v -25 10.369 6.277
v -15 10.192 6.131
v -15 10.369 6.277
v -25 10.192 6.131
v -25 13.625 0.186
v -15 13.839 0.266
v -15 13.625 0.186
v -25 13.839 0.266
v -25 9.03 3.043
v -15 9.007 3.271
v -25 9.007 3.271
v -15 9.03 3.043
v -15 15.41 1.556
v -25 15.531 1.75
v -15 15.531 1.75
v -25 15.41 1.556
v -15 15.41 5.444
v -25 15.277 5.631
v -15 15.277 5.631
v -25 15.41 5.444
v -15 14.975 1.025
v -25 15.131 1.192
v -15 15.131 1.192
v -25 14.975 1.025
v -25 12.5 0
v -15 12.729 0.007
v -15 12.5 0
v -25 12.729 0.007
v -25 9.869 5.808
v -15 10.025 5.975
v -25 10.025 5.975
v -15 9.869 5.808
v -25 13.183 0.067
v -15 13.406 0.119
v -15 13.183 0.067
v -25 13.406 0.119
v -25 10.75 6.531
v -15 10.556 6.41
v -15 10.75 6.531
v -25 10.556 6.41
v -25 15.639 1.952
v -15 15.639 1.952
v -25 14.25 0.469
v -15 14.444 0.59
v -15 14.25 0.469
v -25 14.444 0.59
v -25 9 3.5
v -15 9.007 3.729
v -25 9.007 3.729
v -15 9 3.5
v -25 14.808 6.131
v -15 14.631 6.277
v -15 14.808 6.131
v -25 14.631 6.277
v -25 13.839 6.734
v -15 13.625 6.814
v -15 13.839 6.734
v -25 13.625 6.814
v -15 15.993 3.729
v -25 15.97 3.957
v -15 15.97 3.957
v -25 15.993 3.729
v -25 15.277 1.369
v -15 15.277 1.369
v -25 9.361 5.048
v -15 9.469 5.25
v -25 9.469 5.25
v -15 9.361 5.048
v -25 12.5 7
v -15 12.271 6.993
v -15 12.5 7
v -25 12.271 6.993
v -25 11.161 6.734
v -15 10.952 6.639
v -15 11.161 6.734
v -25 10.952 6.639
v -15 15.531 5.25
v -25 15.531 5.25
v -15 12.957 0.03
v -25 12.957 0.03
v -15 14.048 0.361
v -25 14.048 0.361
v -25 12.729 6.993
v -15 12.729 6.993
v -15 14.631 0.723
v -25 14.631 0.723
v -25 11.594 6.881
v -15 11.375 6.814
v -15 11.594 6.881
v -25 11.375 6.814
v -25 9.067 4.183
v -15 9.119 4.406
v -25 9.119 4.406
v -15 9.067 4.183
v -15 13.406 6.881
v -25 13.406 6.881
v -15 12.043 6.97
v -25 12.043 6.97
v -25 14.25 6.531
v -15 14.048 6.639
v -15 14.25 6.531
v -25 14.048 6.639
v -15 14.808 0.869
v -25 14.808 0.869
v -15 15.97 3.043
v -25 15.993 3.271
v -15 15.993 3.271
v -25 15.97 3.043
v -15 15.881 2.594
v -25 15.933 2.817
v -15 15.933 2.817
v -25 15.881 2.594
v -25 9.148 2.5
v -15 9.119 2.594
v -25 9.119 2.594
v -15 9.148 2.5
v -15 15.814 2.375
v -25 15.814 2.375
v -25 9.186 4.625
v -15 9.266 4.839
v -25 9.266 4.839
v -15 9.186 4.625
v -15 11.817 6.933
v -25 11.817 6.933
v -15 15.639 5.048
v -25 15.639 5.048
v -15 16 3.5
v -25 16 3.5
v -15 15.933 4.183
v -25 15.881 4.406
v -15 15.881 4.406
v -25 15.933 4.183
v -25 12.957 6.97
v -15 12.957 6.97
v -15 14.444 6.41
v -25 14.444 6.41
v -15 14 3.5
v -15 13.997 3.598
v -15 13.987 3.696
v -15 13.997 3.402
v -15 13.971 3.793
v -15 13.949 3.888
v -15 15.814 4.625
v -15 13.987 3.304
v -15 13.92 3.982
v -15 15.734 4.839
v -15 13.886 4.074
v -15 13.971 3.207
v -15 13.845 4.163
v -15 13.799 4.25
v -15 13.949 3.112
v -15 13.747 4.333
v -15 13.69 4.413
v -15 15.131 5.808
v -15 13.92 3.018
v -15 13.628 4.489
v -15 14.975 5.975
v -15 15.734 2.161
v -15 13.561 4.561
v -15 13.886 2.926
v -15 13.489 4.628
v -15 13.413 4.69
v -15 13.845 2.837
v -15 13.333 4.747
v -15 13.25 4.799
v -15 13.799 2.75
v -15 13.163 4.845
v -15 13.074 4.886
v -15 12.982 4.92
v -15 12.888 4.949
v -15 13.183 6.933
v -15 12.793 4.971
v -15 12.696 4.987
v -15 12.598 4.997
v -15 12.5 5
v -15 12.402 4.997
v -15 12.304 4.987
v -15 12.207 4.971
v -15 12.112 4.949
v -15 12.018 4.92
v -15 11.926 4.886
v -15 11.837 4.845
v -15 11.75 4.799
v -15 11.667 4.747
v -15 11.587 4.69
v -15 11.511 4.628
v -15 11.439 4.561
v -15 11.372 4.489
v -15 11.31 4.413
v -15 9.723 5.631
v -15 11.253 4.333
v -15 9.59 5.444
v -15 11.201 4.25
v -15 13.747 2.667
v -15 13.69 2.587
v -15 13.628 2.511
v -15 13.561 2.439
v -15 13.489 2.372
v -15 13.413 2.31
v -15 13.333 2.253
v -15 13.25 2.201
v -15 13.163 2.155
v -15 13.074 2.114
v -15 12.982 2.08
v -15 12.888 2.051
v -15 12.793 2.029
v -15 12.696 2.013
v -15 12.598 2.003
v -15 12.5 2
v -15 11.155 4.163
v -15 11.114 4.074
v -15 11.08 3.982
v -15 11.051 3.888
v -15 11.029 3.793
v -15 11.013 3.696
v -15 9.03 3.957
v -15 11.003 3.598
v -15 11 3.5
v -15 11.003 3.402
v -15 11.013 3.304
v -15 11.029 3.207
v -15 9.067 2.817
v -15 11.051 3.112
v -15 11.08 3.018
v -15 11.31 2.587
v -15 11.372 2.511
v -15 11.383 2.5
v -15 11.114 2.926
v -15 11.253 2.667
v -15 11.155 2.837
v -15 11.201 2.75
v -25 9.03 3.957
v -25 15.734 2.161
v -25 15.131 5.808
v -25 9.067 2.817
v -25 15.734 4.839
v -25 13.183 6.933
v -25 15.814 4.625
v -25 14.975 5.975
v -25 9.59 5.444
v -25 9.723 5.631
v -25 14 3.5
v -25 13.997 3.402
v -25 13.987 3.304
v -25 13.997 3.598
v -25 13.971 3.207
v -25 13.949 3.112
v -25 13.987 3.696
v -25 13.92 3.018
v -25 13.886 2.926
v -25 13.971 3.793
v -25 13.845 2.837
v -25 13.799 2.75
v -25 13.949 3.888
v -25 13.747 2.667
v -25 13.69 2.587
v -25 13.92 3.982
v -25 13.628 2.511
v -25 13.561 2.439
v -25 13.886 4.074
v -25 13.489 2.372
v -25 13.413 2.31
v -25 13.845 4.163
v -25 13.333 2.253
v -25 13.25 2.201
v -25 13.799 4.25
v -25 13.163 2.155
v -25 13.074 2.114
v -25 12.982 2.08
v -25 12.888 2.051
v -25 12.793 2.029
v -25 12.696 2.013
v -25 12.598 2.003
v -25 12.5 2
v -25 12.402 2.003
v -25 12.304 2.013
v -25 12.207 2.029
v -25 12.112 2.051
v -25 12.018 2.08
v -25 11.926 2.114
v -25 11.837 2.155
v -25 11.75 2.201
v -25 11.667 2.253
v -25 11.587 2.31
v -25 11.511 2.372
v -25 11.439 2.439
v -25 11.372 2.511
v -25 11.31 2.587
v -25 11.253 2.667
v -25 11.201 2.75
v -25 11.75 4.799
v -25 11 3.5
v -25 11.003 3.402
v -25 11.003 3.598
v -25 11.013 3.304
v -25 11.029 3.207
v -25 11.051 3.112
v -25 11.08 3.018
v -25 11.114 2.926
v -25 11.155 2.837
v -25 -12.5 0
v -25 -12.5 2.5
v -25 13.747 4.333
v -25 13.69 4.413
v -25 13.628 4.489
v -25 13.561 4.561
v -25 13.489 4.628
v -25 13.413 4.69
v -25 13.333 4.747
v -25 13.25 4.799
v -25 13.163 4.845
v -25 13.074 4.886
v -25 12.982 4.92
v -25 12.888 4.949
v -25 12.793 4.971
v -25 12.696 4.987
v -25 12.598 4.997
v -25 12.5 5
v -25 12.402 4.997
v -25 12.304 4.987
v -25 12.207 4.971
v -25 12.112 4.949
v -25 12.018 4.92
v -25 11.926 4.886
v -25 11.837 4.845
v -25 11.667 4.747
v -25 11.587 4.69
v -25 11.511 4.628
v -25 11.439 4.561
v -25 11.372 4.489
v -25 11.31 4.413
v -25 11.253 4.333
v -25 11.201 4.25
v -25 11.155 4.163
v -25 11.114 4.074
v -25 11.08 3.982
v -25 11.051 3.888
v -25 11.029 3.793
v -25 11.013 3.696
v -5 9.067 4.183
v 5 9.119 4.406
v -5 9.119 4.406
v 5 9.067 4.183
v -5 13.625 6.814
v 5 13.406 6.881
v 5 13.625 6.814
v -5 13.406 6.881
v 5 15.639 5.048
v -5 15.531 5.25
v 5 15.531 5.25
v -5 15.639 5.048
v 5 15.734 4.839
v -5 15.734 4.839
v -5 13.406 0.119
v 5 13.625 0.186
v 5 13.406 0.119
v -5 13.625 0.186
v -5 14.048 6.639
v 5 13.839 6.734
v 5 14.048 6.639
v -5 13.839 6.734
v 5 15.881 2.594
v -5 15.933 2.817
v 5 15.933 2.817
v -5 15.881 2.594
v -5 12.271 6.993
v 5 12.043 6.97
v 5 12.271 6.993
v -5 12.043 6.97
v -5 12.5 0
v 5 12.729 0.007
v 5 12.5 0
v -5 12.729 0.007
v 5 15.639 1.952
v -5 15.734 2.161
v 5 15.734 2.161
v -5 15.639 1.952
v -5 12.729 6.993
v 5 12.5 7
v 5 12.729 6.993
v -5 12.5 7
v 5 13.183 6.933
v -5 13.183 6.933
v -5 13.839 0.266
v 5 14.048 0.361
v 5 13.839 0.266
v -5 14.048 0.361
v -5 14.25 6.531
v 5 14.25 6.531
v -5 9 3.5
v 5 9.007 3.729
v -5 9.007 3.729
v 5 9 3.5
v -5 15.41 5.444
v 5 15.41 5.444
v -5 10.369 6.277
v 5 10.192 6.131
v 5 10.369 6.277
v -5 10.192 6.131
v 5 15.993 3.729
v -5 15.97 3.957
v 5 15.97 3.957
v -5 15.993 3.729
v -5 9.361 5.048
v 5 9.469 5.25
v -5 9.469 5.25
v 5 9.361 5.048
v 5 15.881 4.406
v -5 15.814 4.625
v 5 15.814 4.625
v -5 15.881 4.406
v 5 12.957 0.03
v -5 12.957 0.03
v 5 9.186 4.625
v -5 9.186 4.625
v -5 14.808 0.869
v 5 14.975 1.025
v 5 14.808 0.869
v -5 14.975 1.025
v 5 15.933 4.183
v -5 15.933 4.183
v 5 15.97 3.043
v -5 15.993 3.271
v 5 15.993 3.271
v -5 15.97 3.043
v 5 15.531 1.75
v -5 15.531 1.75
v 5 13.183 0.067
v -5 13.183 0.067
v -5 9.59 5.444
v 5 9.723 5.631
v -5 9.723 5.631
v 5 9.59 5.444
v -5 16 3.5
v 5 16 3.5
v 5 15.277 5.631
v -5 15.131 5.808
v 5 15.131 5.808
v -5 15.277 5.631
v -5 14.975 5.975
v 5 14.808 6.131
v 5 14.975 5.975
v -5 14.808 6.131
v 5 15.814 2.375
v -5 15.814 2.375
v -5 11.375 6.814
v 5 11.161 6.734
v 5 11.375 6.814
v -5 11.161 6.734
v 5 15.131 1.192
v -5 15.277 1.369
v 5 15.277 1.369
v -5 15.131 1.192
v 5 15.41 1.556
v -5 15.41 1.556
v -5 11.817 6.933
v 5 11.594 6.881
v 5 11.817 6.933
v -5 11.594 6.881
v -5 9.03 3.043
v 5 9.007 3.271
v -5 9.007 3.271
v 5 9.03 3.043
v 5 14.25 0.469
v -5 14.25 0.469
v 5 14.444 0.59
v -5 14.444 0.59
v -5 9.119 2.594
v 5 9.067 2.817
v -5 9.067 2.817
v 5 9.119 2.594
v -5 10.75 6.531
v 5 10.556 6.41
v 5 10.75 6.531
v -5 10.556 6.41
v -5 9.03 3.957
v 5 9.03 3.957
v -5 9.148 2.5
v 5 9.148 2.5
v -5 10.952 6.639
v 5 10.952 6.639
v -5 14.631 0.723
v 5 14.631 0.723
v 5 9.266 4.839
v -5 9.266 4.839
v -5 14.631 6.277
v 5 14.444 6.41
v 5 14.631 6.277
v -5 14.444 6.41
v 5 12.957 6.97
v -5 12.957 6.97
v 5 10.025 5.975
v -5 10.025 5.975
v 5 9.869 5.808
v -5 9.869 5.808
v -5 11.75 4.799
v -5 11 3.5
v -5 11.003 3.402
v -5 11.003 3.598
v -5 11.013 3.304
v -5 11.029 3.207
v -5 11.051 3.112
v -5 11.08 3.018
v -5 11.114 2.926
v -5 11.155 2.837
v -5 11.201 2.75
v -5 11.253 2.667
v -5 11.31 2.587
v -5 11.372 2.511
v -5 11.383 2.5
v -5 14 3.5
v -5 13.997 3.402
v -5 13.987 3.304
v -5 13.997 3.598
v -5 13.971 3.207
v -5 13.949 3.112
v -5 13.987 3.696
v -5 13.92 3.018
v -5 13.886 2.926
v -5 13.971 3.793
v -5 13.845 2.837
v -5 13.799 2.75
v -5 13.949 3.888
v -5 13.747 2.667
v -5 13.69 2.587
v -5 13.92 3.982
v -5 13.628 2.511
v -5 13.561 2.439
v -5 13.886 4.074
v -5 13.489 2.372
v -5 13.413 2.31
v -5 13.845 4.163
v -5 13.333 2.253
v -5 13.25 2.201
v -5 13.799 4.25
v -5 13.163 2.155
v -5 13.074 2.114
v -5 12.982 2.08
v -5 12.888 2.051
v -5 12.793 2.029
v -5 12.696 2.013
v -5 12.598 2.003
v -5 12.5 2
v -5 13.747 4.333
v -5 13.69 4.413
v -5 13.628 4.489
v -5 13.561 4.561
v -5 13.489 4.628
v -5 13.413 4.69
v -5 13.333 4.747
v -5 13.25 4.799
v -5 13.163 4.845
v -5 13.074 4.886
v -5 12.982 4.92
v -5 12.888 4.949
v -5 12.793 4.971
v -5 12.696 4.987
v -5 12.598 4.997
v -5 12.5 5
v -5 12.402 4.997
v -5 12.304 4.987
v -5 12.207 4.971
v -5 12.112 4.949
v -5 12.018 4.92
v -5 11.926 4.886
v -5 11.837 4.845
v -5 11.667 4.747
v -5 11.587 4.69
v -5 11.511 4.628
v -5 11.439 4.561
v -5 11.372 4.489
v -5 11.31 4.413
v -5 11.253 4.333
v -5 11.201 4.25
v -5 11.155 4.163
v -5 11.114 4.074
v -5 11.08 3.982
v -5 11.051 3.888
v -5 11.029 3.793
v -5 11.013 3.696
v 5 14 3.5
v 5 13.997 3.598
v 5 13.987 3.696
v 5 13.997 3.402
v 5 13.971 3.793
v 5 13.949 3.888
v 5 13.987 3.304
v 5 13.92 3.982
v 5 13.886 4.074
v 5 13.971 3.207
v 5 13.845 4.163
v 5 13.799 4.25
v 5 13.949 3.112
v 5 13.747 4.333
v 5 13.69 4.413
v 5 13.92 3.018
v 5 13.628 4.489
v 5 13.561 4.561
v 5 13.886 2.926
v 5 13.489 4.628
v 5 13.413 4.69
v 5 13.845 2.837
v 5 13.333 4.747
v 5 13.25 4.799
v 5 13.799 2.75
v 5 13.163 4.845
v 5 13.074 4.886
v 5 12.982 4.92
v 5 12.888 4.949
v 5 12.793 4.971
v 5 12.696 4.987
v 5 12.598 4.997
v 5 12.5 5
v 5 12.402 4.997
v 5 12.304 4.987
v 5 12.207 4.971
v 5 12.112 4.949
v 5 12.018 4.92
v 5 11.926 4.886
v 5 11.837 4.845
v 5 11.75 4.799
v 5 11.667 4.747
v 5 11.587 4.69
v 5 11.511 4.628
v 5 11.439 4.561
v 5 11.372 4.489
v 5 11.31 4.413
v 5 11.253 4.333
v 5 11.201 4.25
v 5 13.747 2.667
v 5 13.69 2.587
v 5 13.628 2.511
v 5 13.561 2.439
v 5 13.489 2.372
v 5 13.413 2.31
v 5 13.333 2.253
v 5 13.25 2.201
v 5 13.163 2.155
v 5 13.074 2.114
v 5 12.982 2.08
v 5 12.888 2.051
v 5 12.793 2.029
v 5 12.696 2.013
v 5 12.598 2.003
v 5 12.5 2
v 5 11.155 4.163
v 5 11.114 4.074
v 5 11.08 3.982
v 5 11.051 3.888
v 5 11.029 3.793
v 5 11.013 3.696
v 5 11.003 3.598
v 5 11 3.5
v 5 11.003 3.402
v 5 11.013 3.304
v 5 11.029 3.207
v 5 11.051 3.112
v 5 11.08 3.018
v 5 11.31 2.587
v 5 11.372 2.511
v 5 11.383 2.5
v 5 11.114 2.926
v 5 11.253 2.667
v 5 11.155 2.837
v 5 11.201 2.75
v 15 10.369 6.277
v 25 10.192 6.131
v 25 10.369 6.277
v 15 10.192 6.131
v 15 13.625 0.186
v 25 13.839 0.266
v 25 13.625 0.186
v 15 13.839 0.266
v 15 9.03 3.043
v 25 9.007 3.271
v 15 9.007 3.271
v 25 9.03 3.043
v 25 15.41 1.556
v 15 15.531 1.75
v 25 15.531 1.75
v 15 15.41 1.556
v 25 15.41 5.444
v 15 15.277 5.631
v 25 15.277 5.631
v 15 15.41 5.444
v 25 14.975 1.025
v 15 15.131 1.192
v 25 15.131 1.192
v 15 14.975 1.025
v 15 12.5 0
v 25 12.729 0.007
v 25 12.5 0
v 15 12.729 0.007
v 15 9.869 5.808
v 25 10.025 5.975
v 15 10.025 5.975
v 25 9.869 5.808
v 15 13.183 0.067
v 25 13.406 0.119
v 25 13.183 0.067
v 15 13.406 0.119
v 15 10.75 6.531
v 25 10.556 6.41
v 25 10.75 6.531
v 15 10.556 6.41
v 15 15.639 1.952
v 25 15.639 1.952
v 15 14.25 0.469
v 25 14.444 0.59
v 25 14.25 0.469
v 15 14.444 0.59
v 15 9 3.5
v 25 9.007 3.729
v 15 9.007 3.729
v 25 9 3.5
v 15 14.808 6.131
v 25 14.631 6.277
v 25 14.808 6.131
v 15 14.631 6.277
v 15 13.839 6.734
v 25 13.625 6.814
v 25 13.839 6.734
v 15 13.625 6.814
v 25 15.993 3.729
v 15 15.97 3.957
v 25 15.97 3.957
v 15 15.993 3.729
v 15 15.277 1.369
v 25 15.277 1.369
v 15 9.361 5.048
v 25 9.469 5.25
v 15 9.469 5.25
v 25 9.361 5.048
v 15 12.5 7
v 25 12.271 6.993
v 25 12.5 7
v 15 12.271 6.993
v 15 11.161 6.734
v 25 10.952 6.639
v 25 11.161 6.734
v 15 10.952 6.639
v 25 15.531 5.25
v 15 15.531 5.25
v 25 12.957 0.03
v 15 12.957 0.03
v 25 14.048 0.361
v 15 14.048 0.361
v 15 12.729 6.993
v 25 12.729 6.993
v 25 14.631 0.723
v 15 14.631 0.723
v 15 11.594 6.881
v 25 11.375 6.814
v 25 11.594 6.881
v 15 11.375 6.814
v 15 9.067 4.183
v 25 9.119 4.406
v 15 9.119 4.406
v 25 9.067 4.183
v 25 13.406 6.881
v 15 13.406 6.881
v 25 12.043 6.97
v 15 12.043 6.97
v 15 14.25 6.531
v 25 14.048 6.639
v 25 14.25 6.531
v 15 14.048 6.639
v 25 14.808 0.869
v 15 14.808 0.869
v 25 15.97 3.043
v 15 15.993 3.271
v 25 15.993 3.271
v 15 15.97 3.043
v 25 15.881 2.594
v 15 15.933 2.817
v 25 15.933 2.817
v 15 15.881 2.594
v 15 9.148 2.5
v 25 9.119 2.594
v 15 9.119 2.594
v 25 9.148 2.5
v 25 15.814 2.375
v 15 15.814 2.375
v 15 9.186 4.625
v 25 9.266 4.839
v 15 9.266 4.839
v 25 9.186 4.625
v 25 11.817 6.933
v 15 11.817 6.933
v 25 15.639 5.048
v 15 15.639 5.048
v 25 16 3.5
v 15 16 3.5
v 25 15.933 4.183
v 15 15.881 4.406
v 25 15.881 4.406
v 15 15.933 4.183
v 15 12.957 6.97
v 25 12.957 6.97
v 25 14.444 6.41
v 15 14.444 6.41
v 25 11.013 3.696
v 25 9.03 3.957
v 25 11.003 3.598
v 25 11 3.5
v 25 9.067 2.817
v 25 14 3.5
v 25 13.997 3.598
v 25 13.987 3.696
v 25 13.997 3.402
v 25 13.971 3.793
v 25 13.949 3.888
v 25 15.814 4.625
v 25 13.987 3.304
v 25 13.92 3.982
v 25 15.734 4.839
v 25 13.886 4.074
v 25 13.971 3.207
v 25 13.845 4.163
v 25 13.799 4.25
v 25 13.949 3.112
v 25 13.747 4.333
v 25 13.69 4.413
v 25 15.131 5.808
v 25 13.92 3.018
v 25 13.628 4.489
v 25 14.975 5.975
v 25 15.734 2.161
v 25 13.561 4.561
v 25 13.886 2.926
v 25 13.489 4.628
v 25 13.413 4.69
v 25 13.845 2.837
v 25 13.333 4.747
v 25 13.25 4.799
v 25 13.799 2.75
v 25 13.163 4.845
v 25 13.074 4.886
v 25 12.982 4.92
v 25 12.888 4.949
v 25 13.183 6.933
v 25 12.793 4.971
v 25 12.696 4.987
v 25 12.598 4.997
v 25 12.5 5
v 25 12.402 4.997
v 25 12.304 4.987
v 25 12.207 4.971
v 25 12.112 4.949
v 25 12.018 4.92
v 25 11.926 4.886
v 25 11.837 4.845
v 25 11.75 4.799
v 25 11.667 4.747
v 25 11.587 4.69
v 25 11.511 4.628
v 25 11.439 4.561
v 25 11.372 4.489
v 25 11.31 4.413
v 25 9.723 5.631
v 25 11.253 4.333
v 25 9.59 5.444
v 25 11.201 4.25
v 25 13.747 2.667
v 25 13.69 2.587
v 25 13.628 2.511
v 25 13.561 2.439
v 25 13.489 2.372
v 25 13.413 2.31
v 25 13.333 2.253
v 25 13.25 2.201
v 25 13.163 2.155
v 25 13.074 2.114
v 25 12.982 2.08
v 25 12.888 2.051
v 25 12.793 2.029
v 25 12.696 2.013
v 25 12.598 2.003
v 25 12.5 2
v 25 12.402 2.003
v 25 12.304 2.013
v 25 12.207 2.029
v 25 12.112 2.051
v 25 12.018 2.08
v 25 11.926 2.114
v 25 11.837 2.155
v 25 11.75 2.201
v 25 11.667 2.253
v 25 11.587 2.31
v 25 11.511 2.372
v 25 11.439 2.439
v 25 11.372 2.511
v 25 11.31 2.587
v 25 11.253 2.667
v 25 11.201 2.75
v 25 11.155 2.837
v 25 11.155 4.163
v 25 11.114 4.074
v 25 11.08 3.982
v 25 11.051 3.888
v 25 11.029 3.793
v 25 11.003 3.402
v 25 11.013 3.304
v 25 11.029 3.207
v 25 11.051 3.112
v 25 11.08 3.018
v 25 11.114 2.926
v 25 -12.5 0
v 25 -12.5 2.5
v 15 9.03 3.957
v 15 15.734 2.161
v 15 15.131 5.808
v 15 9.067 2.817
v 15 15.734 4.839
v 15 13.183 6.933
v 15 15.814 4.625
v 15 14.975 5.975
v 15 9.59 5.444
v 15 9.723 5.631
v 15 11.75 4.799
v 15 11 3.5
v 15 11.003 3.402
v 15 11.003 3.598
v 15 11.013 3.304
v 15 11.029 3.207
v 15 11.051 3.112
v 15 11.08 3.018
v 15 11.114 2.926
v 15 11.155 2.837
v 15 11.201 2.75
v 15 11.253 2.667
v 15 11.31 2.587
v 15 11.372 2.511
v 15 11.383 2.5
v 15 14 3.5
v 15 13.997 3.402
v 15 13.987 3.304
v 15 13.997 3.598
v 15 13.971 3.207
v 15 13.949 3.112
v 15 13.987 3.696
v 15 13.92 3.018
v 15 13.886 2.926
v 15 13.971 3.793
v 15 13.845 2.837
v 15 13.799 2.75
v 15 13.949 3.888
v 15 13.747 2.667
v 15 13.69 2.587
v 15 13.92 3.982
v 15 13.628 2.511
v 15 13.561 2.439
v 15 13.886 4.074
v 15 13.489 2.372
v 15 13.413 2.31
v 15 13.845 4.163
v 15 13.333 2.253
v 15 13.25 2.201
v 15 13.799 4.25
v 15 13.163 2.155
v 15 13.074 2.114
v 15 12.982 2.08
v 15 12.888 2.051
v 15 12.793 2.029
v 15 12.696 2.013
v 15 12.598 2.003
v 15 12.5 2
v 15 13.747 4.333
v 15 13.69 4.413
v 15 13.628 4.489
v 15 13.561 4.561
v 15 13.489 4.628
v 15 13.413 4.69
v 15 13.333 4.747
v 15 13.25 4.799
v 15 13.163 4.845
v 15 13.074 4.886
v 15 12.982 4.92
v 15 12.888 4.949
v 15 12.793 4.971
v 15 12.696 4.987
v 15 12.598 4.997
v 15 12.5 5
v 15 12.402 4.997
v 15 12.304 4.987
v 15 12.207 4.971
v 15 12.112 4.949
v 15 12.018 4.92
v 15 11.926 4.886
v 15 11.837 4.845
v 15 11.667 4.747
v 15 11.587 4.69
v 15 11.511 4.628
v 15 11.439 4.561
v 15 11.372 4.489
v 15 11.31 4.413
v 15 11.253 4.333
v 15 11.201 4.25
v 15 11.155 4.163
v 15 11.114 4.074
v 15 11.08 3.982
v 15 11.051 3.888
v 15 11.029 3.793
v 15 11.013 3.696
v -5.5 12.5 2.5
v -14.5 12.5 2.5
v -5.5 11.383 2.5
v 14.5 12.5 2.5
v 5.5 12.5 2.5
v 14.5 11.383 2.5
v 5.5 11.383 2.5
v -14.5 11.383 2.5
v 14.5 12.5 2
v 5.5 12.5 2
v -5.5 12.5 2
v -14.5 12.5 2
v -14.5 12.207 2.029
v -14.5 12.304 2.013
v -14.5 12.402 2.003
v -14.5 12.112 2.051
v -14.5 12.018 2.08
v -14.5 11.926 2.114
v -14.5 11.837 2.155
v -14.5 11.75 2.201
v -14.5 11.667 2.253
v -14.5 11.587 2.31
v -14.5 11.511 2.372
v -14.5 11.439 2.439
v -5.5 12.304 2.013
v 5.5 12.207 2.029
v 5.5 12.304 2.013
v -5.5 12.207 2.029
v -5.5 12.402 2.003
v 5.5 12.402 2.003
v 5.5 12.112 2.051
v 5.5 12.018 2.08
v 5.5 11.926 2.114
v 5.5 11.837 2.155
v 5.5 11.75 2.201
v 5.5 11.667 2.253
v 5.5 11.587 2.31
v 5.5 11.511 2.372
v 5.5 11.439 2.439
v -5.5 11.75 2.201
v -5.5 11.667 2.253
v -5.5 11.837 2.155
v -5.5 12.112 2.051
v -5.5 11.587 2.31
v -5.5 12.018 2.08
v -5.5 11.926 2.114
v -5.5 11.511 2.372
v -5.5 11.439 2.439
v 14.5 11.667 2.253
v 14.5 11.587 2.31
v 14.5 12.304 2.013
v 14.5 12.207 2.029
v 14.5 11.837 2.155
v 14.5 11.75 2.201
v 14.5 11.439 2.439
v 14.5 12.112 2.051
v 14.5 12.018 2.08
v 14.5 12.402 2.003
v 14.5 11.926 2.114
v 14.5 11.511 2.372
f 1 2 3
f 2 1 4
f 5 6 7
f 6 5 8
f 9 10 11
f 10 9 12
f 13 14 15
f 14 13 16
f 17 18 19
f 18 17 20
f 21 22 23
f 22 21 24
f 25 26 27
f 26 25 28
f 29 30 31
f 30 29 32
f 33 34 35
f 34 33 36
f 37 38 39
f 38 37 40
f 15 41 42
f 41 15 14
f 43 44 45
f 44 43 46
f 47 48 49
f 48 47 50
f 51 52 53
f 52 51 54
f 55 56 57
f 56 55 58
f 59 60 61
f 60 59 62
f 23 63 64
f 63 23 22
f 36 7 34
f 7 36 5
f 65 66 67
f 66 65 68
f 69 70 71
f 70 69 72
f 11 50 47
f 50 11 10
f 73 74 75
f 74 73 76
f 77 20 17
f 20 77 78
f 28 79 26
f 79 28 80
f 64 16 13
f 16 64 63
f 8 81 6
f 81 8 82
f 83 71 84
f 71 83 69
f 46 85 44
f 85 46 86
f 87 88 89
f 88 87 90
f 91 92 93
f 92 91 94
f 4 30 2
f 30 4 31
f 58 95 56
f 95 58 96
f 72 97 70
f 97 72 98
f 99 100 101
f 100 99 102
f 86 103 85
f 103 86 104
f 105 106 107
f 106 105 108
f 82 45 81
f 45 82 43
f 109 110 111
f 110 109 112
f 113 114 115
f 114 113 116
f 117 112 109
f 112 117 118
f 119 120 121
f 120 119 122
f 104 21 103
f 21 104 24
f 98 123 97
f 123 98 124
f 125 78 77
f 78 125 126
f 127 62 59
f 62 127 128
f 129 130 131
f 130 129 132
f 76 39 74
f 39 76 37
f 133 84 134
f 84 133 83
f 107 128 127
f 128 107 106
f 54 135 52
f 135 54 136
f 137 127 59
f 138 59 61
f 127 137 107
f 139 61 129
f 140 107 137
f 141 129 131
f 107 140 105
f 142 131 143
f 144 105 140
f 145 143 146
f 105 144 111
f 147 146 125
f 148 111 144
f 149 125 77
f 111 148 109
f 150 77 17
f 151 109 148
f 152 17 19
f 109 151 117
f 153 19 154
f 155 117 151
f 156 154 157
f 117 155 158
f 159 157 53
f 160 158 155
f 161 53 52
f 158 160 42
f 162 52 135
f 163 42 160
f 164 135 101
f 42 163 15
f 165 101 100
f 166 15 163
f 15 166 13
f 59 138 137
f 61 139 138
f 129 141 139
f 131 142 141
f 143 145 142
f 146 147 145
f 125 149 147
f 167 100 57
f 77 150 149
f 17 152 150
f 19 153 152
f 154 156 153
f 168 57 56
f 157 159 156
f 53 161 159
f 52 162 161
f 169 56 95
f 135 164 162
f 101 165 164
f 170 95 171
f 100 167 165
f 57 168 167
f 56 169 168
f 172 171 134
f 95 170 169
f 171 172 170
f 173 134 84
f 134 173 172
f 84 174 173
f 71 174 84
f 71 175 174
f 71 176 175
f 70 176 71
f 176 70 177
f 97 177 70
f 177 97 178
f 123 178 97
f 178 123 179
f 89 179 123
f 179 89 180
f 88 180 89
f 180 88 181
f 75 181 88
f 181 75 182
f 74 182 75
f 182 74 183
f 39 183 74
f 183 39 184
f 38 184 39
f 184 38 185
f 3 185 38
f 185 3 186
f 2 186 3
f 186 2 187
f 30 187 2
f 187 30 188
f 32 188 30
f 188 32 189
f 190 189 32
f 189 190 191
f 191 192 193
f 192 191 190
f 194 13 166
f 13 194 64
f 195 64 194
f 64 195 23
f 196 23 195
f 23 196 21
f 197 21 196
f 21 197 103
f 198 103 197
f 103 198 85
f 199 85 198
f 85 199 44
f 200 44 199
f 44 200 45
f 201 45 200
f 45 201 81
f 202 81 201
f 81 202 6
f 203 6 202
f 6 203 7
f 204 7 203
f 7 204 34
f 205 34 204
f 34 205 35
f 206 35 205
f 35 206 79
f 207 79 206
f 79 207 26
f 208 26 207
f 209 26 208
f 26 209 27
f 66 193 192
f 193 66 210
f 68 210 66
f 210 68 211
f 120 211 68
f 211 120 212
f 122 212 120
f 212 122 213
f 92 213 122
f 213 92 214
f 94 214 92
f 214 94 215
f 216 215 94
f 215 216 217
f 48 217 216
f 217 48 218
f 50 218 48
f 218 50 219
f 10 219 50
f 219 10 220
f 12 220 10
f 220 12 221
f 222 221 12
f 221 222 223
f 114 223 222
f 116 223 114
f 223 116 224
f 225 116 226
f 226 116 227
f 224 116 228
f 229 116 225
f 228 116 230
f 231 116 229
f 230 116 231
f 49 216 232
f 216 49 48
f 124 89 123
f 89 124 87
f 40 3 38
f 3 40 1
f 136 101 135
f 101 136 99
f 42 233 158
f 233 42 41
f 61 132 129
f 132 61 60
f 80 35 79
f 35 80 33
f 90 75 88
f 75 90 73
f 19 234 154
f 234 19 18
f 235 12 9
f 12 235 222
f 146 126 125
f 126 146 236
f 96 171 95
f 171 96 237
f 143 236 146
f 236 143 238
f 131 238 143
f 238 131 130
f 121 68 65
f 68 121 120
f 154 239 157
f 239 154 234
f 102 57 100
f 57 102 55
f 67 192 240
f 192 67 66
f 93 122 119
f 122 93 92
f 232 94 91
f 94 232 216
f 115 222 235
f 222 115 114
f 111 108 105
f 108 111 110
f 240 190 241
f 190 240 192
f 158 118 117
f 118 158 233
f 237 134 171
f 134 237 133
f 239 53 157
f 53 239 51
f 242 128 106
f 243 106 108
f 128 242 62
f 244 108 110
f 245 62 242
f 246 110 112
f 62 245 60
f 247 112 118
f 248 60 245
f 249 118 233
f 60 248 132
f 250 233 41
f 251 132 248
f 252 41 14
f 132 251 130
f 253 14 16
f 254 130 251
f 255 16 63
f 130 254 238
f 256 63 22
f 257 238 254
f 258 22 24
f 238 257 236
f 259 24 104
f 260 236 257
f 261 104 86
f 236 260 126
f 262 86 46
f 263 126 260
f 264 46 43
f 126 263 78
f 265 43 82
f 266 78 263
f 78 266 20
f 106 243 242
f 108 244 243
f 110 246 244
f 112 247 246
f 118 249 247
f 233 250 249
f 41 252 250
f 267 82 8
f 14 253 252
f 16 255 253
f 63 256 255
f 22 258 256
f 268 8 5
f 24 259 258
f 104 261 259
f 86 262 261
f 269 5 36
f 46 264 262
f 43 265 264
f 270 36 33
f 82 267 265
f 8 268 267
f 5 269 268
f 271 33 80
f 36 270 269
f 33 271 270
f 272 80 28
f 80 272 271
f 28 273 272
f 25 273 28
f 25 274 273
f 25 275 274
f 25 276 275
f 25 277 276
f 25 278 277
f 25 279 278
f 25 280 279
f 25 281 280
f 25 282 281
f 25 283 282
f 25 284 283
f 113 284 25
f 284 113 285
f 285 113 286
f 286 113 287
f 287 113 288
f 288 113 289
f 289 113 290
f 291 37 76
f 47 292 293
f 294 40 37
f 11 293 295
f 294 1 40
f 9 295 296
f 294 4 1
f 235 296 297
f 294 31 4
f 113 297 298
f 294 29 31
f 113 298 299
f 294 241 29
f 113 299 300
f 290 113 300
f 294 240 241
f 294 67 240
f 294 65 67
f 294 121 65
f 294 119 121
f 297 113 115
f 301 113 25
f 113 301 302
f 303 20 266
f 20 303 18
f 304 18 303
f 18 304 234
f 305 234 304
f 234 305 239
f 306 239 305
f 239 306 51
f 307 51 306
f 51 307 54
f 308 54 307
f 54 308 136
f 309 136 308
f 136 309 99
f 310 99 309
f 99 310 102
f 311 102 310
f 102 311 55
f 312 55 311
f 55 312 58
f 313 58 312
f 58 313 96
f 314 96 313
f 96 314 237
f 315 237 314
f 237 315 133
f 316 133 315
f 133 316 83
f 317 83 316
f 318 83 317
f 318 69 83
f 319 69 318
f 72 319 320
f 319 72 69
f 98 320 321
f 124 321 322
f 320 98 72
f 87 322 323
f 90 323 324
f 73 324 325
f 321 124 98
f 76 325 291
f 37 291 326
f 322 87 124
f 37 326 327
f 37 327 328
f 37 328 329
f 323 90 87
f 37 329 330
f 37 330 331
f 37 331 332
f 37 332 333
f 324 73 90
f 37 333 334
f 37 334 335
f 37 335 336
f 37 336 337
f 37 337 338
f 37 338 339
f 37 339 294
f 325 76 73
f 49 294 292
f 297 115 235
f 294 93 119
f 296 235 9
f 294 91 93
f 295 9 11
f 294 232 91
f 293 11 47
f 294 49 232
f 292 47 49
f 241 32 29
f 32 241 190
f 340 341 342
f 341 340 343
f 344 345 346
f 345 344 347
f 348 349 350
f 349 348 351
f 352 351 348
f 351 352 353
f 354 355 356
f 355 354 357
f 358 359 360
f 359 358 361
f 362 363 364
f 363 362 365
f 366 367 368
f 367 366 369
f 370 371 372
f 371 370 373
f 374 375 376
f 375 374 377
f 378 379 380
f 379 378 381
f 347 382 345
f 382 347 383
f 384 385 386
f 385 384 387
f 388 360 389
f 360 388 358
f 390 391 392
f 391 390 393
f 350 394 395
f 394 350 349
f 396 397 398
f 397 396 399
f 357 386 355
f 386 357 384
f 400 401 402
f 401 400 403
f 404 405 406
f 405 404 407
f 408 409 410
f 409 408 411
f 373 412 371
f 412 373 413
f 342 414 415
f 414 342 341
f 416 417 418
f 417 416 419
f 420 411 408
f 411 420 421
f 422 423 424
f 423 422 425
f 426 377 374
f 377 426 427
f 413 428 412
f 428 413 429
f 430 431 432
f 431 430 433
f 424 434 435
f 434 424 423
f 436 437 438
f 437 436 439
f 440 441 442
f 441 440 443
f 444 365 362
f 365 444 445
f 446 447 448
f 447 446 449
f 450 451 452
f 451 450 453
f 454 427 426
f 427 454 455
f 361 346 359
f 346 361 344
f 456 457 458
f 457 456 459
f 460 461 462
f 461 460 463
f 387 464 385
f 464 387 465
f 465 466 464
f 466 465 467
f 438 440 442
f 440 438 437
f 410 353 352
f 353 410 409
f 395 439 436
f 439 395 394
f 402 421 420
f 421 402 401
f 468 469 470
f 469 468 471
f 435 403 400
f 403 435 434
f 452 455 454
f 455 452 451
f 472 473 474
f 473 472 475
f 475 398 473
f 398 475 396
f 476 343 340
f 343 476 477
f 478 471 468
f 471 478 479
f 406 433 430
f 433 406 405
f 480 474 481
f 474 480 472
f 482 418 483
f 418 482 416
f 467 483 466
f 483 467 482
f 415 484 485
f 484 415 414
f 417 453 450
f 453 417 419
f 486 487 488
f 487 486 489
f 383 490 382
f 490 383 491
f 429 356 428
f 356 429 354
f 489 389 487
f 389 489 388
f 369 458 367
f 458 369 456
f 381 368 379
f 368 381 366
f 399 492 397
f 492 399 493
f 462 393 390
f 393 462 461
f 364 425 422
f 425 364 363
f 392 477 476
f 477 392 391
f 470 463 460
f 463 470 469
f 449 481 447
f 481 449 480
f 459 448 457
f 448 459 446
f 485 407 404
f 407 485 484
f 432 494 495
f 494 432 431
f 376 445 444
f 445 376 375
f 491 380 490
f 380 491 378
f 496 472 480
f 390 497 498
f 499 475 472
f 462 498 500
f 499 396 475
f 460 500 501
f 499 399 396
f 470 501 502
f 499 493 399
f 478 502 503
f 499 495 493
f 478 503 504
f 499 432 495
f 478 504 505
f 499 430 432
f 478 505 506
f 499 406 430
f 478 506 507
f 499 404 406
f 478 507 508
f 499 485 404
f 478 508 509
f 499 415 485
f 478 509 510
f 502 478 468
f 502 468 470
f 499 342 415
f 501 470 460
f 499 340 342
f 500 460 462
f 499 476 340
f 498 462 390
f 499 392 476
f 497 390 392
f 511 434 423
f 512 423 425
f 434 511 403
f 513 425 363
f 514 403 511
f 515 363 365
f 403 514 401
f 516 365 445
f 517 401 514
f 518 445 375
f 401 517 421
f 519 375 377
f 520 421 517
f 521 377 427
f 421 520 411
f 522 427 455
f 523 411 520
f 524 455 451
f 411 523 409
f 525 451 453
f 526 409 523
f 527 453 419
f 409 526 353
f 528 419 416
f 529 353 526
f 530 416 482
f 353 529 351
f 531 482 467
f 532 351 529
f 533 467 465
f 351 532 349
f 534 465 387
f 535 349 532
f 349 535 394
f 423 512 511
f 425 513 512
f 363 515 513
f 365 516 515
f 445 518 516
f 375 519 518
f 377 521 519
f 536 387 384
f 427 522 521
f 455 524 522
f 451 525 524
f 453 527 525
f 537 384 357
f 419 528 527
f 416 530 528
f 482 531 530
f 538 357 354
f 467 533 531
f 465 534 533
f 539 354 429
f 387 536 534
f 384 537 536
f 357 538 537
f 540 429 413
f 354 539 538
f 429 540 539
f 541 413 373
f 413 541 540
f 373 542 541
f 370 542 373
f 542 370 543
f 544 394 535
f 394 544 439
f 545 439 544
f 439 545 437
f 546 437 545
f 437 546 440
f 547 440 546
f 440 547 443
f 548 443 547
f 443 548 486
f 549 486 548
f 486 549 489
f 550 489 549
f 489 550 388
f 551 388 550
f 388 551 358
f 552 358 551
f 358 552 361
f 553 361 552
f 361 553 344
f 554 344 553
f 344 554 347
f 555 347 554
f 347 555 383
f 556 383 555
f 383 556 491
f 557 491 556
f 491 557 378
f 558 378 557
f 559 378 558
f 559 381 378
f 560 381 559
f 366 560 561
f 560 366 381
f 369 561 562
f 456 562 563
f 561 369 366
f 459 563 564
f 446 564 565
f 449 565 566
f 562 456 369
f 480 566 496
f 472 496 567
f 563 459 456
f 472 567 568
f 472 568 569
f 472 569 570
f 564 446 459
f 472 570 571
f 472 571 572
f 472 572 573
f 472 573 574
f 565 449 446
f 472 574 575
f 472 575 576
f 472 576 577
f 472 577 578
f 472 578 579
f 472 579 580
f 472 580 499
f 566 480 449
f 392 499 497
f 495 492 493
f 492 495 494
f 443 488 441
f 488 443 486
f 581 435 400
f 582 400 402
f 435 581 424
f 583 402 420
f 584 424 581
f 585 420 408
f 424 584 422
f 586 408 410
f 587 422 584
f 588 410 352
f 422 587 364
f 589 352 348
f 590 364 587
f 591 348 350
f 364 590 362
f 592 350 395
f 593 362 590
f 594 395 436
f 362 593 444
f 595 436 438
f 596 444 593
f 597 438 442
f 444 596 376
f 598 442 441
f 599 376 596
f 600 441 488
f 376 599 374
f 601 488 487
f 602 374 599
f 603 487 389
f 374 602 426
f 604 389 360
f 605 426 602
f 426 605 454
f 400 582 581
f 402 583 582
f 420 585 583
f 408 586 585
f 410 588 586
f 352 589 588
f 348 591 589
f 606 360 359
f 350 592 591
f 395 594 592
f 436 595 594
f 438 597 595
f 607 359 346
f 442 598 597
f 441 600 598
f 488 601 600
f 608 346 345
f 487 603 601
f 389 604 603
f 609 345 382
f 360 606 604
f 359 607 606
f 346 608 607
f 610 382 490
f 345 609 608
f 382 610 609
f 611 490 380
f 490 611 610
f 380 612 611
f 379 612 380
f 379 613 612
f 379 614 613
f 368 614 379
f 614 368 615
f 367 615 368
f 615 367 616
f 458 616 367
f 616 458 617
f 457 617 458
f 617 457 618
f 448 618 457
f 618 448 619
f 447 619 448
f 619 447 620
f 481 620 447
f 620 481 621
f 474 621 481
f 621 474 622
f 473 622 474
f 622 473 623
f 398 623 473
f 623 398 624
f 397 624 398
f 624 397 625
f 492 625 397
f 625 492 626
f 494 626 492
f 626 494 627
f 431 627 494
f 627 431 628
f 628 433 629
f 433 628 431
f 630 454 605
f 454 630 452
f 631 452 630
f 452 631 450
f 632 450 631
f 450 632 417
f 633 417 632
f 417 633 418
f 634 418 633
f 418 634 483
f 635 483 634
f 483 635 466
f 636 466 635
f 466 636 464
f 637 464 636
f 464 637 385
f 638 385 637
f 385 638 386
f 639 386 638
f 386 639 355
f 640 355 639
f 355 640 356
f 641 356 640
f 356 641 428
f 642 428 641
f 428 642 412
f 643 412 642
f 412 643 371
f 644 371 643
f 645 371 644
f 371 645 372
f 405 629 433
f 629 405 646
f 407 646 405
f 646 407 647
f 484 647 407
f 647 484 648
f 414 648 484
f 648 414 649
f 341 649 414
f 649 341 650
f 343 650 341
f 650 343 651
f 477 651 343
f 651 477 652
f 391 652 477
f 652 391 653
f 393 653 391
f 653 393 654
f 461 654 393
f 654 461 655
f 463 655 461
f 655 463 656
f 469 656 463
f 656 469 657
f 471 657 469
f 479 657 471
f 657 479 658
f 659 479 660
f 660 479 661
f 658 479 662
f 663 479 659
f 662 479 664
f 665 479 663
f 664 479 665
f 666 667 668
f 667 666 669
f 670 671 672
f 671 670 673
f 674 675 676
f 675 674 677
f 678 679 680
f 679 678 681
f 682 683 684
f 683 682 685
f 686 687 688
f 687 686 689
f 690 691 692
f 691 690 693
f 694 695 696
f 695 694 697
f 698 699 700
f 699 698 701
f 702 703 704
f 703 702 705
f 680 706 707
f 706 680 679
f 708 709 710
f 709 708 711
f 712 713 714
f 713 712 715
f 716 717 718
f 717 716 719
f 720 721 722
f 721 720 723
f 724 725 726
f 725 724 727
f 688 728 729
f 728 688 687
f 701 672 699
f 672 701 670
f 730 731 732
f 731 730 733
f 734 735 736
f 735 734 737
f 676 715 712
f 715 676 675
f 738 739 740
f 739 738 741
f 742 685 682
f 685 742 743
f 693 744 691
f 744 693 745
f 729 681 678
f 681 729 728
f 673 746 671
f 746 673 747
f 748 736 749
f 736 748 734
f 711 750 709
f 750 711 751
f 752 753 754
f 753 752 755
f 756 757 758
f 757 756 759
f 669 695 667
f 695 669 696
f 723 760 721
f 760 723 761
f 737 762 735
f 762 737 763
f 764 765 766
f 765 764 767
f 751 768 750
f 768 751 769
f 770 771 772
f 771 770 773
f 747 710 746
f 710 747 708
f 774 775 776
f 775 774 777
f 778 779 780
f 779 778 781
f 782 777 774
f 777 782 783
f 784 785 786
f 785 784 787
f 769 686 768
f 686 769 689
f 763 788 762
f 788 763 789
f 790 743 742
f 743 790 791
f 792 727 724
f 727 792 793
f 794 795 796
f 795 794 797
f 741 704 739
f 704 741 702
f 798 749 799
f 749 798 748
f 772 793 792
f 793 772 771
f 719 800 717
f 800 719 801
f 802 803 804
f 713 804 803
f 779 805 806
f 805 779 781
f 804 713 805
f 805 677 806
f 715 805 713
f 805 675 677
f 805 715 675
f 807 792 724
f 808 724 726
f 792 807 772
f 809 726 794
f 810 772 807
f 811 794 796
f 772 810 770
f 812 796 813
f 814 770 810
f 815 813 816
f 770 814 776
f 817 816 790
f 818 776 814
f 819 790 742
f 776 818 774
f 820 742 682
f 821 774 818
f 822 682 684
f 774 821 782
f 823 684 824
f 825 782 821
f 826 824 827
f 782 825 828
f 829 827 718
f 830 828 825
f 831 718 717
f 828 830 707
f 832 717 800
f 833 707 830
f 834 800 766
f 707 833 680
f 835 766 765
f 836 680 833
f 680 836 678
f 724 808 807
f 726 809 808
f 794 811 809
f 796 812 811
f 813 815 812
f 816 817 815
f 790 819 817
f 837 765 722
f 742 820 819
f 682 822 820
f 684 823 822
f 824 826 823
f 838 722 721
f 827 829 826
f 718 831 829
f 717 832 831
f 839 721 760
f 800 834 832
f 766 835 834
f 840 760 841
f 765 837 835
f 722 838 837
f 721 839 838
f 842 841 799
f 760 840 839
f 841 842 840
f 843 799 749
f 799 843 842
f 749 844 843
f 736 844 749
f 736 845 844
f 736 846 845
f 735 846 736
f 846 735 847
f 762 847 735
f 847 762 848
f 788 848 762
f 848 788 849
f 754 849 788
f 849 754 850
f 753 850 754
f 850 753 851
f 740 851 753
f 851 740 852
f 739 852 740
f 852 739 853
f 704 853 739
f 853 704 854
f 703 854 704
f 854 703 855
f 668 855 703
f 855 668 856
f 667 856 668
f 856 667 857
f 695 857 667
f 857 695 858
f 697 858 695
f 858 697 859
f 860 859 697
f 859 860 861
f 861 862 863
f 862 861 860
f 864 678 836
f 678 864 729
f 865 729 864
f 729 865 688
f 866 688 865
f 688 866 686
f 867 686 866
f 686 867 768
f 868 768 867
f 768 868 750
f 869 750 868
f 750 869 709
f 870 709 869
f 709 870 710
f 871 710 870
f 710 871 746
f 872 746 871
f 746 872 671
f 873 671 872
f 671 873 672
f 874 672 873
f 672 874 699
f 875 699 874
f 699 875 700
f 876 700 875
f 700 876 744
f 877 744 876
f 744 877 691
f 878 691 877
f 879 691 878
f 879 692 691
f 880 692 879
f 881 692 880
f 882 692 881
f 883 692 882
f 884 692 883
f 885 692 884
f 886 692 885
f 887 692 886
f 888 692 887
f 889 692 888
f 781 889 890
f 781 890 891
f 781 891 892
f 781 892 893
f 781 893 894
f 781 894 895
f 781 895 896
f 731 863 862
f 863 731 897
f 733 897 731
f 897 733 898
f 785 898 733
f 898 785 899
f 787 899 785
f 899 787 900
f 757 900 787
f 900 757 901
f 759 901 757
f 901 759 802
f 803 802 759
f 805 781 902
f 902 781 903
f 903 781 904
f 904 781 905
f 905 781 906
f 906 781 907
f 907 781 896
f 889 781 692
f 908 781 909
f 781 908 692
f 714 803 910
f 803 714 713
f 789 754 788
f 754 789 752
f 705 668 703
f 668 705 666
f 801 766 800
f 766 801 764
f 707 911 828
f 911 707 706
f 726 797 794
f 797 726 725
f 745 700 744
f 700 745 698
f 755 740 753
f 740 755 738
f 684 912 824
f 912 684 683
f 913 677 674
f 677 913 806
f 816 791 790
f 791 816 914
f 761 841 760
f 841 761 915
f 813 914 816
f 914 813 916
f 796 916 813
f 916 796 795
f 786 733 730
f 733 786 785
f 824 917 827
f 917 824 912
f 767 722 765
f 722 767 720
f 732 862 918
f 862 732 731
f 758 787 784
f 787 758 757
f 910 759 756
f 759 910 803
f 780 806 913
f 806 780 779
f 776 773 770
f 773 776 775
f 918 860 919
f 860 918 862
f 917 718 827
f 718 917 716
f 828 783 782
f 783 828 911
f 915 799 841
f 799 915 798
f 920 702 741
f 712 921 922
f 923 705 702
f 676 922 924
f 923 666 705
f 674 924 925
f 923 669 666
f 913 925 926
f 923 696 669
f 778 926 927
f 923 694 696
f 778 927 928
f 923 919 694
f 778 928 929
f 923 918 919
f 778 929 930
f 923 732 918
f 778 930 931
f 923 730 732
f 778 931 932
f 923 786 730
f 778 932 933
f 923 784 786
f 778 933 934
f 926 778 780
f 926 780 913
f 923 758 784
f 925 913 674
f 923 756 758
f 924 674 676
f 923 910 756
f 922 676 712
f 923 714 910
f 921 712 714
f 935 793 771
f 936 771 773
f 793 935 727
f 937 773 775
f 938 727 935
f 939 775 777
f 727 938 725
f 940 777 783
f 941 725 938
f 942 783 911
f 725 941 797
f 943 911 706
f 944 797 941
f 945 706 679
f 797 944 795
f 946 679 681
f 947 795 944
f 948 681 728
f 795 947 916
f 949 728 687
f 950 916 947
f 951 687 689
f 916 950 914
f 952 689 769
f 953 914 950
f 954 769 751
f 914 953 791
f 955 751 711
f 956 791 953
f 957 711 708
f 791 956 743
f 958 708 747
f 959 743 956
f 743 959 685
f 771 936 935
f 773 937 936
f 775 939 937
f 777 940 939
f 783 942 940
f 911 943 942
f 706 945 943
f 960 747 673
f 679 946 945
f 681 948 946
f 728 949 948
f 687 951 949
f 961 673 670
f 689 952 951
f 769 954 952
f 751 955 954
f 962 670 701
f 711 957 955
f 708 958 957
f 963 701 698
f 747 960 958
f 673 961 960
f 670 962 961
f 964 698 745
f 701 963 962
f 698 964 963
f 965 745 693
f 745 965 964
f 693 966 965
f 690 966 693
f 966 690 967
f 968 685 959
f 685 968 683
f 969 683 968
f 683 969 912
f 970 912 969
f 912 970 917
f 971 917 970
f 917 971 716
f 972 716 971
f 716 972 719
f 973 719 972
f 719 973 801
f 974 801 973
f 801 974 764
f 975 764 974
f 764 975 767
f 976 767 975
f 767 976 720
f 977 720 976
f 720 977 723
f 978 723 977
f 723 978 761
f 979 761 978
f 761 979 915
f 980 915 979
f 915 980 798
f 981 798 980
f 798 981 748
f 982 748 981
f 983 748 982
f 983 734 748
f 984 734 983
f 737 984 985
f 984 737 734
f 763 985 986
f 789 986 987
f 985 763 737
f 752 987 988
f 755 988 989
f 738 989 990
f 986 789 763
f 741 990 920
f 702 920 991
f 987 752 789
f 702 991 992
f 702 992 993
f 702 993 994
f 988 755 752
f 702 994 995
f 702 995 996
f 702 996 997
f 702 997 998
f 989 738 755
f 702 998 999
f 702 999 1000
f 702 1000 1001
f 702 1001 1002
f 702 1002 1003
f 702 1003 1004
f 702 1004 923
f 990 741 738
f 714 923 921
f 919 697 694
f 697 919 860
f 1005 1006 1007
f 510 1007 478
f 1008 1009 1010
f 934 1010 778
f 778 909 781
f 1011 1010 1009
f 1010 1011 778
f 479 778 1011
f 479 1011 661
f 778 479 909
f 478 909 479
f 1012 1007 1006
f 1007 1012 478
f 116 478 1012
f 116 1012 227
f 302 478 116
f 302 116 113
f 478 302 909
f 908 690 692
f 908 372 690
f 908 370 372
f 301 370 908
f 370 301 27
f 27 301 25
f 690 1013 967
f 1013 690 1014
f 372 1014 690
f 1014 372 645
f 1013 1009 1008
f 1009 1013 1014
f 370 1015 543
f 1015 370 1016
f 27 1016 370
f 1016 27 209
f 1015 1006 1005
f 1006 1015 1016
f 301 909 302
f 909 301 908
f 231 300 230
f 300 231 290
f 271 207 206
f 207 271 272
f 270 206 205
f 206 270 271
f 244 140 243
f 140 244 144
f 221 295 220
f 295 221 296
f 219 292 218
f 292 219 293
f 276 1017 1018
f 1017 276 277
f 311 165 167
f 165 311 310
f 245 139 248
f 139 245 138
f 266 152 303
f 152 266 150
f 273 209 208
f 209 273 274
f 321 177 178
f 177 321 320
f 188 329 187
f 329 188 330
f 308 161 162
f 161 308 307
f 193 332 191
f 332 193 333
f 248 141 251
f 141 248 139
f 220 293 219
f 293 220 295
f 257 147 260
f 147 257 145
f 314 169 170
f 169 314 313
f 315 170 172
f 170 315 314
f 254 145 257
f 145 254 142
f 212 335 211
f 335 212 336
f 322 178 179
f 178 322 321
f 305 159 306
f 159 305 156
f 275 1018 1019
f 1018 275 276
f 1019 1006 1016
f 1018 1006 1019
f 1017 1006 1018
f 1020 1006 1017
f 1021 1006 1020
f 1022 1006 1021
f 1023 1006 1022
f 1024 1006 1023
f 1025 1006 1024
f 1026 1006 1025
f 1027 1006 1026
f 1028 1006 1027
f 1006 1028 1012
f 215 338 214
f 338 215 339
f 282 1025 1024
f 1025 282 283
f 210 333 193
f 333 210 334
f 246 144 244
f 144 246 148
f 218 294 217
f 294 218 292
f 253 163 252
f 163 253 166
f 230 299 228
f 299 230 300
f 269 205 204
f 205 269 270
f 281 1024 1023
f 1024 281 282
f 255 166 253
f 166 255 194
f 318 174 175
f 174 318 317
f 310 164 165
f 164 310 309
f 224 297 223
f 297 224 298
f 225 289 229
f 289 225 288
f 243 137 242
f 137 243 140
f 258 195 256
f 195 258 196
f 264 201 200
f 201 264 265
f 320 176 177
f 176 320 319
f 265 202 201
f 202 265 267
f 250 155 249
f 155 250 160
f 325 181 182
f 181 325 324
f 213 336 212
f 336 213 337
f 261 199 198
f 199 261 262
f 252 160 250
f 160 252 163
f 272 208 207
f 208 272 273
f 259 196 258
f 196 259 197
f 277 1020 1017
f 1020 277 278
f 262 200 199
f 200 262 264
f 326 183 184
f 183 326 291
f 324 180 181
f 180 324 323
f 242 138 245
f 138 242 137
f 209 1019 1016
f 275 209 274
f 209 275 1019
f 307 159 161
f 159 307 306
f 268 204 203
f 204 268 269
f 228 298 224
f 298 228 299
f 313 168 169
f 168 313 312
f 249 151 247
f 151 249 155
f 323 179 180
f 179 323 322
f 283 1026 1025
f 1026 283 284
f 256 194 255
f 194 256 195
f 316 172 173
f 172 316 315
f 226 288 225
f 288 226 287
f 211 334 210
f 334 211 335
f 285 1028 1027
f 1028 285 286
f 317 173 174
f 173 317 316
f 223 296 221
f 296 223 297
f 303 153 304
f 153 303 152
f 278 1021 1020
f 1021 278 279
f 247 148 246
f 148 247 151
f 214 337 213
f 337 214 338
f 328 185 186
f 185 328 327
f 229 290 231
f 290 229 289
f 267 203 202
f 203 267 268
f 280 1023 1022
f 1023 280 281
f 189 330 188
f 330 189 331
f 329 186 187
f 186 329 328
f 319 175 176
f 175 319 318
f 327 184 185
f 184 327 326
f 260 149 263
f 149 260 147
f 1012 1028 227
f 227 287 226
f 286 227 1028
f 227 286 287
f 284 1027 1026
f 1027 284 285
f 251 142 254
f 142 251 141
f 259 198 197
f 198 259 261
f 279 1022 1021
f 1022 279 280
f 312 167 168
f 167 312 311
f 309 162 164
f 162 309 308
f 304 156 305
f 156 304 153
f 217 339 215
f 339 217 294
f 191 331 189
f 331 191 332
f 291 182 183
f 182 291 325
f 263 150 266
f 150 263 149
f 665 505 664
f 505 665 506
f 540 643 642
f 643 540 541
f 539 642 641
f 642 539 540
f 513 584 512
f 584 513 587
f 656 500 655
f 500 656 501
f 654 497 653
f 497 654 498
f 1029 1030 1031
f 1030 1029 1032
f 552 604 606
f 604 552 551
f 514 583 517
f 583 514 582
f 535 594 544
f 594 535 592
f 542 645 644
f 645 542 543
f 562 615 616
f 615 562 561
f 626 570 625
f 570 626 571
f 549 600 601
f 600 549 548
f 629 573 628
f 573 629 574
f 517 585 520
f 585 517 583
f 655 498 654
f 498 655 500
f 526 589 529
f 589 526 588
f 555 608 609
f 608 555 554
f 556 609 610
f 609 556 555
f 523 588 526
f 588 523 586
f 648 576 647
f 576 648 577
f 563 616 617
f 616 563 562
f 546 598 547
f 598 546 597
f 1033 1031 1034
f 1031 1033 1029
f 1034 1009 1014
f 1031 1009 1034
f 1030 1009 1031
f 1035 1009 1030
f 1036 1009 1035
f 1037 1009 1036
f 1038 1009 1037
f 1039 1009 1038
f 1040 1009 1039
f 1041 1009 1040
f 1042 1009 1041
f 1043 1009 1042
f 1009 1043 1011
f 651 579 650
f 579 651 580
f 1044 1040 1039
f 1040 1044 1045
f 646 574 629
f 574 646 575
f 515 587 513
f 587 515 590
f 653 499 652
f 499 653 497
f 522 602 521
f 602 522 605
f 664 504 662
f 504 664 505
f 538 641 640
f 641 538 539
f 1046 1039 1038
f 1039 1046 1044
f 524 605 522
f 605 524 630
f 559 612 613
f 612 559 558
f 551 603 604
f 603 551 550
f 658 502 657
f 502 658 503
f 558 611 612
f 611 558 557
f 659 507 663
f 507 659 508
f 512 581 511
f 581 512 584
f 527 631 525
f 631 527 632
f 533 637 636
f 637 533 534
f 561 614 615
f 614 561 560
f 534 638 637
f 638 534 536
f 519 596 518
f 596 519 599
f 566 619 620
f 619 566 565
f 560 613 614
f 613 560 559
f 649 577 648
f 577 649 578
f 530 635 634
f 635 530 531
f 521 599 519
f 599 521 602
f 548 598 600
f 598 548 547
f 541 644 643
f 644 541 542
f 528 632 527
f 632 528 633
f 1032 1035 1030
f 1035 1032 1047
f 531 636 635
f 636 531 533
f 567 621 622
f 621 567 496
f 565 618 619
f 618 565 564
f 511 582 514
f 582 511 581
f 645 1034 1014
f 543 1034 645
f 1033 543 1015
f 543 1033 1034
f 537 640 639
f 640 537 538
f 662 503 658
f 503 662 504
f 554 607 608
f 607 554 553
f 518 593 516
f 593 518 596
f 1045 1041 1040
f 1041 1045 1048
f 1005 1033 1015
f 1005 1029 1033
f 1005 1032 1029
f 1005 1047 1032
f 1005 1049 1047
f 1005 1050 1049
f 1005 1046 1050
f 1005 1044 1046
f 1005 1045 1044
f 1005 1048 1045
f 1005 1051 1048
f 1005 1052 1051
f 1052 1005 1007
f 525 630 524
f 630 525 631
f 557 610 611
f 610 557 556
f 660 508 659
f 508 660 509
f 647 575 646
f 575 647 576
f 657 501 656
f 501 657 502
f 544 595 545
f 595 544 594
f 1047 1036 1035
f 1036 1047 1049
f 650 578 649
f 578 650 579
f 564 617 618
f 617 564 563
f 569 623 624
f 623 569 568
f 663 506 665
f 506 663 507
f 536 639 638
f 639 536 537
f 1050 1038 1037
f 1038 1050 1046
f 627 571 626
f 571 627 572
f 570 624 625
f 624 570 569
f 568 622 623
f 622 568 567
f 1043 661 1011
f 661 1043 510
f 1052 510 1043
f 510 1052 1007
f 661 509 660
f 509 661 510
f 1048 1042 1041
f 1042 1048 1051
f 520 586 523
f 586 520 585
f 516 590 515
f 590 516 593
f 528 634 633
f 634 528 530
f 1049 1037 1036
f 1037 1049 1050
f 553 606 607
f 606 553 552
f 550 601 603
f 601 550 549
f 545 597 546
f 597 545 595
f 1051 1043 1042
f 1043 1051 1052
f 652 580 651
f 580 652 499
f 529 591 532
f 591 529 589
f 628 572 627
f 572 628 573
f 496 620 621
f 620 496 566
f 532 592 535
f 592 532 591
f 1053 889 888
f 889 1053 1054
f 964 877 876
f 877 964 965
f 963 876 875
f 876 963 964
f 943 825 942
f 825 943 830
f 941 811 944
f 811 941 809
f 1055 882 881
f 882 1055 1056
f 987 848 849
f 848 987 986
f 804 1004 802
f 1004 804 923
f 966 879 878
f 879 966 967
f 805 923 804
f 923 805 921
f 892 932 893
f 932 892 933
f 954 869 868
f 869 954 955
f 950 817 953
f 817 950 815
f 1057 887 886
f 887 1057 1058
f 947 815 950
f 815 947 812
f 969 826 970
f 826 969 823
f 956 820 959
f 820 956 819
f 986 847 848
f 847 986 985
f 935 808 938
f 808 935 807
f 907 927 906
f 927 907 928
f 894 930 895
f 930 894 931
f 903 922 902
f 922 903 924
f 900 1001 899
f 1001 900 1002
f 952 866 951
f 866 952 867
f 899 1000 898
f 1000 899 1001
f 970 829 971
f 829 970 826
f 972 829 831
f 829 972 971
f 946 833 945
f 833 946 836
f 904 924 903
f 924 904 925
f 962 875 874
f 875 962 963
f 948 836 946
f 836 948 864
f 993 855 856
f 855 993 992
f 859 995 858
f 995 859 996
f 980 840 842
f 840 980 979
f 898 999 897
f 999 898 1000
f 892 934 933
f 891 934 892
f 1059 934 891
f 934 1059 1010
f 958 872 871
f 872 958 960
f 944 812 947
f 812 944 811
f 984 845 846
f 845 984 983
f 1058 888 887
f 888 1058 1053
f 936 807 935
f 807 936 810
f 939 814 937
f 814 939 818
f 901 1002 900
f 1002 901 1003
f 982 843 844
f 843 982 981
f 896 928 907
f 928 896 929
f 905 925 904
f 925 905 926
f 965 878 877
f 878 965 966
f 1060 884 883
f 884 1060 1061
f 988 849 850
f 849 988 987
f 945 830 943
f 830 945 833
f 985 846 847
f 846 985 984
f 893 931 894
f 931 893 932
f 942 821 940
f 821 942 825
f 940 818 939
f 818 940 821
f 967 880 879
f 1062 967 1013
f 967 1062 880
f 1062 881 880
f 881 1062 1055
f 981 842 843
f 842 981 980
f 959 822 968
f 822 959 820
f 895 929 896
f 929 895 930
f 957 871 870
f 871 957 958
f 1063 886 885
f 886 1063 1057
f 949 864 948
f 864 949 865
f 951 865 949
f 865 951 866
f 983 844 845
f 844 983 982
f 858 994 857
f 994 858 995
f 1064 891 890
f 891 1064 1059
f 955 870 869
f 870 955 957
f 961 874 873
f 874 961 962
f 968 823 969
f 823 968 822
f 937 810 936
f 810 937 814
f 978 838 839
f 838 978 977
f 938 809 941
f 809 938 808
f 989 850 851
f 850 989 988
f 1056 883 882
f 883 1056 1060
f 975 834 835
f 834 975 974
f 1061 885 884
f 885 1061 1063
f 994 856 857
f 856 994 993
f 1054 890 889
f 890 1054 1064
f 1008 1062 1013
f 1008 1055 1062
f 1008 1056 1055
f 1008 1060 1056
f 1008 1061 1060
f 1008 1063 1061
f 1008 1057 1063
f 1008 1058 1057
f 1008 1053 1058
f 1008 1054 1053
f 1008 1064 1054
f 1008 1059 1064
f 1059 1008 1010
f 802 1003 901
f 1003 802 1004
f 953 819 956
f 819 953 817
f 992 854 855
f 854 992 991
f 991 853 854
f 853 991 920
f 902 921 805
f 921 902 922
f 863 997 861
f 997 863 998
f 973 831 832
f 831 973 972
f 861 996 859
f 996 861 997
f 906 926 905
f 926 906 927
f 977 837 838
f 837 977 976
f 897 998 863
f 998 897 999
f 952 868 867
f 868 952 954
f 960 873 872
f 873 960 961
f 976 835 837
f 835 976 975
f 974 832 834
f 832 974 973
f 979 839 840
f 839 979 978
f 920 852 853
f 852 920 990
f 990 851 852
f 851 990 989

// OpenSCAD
// Pin hinge leaf
// Prints flat: plate on the bed, knuckles along the +Y edge

$fn = 96;

// ---------- Plate ----------
plate_len   = 50;    // length along X
plate_wid   = 25;    // width along Y
plate_thk   = 2.5;   // thickness along Z

// ---------- Knuckles ----------
seg_count   = 5;                    // number of equal segments along the edge
seg_len     = plate_len / seg_count; // 10 mm per segment
knuckle_d   = 7;     // knuckle outer diameter
knuckle_y   = 12.5;  // knuckle axis Y position (plate +Y edge)
knuckle_z   = 3.5;   // knuckle axis Z position (bottom touches bed)

// ---------- Pin hole ----------
pin_d       = 3;     // pin hole diameter
cut_ext     = 0.5;   // overshoot of the hole past each knuckle face

// Segment indices (0-based) that carry knuckles: 1st, 3rd, 5th
knuckle_segs = [0, 2, 4];

// X start of a given segment
function seg_x0(i) = -plate_len/2 + i * seg_len;

module knuckle(i) {
    translate([seg_x0(i), knuckle_y, knuckle_z])
        rotate([0, 90, 0])
            cylinder(d = knuckle_d, h = seg_len);
}

module pin_cut(i) {
    translate([seg_x0(i) - cut_ext, knuckle_y, knuckle_z])
        rotate([0, 90, 0])
            cylinder(d = pin_d, h = seg_len + 2*cut_ext);
}

difference() {
    union() {
        // Flat plate centred on origin
        translate([-plate_len/2, -plate_wid/2, 0])
            cube([plate_len, plate_wid, plate_thk]);

        // Knuckles on segments 1, 3, 5
        for (i = knuckle_segs) knuckle(i);
    }

    // Pin hole through every knuckle
    for (i = knuckle_segs) pin_cut(i);
}
